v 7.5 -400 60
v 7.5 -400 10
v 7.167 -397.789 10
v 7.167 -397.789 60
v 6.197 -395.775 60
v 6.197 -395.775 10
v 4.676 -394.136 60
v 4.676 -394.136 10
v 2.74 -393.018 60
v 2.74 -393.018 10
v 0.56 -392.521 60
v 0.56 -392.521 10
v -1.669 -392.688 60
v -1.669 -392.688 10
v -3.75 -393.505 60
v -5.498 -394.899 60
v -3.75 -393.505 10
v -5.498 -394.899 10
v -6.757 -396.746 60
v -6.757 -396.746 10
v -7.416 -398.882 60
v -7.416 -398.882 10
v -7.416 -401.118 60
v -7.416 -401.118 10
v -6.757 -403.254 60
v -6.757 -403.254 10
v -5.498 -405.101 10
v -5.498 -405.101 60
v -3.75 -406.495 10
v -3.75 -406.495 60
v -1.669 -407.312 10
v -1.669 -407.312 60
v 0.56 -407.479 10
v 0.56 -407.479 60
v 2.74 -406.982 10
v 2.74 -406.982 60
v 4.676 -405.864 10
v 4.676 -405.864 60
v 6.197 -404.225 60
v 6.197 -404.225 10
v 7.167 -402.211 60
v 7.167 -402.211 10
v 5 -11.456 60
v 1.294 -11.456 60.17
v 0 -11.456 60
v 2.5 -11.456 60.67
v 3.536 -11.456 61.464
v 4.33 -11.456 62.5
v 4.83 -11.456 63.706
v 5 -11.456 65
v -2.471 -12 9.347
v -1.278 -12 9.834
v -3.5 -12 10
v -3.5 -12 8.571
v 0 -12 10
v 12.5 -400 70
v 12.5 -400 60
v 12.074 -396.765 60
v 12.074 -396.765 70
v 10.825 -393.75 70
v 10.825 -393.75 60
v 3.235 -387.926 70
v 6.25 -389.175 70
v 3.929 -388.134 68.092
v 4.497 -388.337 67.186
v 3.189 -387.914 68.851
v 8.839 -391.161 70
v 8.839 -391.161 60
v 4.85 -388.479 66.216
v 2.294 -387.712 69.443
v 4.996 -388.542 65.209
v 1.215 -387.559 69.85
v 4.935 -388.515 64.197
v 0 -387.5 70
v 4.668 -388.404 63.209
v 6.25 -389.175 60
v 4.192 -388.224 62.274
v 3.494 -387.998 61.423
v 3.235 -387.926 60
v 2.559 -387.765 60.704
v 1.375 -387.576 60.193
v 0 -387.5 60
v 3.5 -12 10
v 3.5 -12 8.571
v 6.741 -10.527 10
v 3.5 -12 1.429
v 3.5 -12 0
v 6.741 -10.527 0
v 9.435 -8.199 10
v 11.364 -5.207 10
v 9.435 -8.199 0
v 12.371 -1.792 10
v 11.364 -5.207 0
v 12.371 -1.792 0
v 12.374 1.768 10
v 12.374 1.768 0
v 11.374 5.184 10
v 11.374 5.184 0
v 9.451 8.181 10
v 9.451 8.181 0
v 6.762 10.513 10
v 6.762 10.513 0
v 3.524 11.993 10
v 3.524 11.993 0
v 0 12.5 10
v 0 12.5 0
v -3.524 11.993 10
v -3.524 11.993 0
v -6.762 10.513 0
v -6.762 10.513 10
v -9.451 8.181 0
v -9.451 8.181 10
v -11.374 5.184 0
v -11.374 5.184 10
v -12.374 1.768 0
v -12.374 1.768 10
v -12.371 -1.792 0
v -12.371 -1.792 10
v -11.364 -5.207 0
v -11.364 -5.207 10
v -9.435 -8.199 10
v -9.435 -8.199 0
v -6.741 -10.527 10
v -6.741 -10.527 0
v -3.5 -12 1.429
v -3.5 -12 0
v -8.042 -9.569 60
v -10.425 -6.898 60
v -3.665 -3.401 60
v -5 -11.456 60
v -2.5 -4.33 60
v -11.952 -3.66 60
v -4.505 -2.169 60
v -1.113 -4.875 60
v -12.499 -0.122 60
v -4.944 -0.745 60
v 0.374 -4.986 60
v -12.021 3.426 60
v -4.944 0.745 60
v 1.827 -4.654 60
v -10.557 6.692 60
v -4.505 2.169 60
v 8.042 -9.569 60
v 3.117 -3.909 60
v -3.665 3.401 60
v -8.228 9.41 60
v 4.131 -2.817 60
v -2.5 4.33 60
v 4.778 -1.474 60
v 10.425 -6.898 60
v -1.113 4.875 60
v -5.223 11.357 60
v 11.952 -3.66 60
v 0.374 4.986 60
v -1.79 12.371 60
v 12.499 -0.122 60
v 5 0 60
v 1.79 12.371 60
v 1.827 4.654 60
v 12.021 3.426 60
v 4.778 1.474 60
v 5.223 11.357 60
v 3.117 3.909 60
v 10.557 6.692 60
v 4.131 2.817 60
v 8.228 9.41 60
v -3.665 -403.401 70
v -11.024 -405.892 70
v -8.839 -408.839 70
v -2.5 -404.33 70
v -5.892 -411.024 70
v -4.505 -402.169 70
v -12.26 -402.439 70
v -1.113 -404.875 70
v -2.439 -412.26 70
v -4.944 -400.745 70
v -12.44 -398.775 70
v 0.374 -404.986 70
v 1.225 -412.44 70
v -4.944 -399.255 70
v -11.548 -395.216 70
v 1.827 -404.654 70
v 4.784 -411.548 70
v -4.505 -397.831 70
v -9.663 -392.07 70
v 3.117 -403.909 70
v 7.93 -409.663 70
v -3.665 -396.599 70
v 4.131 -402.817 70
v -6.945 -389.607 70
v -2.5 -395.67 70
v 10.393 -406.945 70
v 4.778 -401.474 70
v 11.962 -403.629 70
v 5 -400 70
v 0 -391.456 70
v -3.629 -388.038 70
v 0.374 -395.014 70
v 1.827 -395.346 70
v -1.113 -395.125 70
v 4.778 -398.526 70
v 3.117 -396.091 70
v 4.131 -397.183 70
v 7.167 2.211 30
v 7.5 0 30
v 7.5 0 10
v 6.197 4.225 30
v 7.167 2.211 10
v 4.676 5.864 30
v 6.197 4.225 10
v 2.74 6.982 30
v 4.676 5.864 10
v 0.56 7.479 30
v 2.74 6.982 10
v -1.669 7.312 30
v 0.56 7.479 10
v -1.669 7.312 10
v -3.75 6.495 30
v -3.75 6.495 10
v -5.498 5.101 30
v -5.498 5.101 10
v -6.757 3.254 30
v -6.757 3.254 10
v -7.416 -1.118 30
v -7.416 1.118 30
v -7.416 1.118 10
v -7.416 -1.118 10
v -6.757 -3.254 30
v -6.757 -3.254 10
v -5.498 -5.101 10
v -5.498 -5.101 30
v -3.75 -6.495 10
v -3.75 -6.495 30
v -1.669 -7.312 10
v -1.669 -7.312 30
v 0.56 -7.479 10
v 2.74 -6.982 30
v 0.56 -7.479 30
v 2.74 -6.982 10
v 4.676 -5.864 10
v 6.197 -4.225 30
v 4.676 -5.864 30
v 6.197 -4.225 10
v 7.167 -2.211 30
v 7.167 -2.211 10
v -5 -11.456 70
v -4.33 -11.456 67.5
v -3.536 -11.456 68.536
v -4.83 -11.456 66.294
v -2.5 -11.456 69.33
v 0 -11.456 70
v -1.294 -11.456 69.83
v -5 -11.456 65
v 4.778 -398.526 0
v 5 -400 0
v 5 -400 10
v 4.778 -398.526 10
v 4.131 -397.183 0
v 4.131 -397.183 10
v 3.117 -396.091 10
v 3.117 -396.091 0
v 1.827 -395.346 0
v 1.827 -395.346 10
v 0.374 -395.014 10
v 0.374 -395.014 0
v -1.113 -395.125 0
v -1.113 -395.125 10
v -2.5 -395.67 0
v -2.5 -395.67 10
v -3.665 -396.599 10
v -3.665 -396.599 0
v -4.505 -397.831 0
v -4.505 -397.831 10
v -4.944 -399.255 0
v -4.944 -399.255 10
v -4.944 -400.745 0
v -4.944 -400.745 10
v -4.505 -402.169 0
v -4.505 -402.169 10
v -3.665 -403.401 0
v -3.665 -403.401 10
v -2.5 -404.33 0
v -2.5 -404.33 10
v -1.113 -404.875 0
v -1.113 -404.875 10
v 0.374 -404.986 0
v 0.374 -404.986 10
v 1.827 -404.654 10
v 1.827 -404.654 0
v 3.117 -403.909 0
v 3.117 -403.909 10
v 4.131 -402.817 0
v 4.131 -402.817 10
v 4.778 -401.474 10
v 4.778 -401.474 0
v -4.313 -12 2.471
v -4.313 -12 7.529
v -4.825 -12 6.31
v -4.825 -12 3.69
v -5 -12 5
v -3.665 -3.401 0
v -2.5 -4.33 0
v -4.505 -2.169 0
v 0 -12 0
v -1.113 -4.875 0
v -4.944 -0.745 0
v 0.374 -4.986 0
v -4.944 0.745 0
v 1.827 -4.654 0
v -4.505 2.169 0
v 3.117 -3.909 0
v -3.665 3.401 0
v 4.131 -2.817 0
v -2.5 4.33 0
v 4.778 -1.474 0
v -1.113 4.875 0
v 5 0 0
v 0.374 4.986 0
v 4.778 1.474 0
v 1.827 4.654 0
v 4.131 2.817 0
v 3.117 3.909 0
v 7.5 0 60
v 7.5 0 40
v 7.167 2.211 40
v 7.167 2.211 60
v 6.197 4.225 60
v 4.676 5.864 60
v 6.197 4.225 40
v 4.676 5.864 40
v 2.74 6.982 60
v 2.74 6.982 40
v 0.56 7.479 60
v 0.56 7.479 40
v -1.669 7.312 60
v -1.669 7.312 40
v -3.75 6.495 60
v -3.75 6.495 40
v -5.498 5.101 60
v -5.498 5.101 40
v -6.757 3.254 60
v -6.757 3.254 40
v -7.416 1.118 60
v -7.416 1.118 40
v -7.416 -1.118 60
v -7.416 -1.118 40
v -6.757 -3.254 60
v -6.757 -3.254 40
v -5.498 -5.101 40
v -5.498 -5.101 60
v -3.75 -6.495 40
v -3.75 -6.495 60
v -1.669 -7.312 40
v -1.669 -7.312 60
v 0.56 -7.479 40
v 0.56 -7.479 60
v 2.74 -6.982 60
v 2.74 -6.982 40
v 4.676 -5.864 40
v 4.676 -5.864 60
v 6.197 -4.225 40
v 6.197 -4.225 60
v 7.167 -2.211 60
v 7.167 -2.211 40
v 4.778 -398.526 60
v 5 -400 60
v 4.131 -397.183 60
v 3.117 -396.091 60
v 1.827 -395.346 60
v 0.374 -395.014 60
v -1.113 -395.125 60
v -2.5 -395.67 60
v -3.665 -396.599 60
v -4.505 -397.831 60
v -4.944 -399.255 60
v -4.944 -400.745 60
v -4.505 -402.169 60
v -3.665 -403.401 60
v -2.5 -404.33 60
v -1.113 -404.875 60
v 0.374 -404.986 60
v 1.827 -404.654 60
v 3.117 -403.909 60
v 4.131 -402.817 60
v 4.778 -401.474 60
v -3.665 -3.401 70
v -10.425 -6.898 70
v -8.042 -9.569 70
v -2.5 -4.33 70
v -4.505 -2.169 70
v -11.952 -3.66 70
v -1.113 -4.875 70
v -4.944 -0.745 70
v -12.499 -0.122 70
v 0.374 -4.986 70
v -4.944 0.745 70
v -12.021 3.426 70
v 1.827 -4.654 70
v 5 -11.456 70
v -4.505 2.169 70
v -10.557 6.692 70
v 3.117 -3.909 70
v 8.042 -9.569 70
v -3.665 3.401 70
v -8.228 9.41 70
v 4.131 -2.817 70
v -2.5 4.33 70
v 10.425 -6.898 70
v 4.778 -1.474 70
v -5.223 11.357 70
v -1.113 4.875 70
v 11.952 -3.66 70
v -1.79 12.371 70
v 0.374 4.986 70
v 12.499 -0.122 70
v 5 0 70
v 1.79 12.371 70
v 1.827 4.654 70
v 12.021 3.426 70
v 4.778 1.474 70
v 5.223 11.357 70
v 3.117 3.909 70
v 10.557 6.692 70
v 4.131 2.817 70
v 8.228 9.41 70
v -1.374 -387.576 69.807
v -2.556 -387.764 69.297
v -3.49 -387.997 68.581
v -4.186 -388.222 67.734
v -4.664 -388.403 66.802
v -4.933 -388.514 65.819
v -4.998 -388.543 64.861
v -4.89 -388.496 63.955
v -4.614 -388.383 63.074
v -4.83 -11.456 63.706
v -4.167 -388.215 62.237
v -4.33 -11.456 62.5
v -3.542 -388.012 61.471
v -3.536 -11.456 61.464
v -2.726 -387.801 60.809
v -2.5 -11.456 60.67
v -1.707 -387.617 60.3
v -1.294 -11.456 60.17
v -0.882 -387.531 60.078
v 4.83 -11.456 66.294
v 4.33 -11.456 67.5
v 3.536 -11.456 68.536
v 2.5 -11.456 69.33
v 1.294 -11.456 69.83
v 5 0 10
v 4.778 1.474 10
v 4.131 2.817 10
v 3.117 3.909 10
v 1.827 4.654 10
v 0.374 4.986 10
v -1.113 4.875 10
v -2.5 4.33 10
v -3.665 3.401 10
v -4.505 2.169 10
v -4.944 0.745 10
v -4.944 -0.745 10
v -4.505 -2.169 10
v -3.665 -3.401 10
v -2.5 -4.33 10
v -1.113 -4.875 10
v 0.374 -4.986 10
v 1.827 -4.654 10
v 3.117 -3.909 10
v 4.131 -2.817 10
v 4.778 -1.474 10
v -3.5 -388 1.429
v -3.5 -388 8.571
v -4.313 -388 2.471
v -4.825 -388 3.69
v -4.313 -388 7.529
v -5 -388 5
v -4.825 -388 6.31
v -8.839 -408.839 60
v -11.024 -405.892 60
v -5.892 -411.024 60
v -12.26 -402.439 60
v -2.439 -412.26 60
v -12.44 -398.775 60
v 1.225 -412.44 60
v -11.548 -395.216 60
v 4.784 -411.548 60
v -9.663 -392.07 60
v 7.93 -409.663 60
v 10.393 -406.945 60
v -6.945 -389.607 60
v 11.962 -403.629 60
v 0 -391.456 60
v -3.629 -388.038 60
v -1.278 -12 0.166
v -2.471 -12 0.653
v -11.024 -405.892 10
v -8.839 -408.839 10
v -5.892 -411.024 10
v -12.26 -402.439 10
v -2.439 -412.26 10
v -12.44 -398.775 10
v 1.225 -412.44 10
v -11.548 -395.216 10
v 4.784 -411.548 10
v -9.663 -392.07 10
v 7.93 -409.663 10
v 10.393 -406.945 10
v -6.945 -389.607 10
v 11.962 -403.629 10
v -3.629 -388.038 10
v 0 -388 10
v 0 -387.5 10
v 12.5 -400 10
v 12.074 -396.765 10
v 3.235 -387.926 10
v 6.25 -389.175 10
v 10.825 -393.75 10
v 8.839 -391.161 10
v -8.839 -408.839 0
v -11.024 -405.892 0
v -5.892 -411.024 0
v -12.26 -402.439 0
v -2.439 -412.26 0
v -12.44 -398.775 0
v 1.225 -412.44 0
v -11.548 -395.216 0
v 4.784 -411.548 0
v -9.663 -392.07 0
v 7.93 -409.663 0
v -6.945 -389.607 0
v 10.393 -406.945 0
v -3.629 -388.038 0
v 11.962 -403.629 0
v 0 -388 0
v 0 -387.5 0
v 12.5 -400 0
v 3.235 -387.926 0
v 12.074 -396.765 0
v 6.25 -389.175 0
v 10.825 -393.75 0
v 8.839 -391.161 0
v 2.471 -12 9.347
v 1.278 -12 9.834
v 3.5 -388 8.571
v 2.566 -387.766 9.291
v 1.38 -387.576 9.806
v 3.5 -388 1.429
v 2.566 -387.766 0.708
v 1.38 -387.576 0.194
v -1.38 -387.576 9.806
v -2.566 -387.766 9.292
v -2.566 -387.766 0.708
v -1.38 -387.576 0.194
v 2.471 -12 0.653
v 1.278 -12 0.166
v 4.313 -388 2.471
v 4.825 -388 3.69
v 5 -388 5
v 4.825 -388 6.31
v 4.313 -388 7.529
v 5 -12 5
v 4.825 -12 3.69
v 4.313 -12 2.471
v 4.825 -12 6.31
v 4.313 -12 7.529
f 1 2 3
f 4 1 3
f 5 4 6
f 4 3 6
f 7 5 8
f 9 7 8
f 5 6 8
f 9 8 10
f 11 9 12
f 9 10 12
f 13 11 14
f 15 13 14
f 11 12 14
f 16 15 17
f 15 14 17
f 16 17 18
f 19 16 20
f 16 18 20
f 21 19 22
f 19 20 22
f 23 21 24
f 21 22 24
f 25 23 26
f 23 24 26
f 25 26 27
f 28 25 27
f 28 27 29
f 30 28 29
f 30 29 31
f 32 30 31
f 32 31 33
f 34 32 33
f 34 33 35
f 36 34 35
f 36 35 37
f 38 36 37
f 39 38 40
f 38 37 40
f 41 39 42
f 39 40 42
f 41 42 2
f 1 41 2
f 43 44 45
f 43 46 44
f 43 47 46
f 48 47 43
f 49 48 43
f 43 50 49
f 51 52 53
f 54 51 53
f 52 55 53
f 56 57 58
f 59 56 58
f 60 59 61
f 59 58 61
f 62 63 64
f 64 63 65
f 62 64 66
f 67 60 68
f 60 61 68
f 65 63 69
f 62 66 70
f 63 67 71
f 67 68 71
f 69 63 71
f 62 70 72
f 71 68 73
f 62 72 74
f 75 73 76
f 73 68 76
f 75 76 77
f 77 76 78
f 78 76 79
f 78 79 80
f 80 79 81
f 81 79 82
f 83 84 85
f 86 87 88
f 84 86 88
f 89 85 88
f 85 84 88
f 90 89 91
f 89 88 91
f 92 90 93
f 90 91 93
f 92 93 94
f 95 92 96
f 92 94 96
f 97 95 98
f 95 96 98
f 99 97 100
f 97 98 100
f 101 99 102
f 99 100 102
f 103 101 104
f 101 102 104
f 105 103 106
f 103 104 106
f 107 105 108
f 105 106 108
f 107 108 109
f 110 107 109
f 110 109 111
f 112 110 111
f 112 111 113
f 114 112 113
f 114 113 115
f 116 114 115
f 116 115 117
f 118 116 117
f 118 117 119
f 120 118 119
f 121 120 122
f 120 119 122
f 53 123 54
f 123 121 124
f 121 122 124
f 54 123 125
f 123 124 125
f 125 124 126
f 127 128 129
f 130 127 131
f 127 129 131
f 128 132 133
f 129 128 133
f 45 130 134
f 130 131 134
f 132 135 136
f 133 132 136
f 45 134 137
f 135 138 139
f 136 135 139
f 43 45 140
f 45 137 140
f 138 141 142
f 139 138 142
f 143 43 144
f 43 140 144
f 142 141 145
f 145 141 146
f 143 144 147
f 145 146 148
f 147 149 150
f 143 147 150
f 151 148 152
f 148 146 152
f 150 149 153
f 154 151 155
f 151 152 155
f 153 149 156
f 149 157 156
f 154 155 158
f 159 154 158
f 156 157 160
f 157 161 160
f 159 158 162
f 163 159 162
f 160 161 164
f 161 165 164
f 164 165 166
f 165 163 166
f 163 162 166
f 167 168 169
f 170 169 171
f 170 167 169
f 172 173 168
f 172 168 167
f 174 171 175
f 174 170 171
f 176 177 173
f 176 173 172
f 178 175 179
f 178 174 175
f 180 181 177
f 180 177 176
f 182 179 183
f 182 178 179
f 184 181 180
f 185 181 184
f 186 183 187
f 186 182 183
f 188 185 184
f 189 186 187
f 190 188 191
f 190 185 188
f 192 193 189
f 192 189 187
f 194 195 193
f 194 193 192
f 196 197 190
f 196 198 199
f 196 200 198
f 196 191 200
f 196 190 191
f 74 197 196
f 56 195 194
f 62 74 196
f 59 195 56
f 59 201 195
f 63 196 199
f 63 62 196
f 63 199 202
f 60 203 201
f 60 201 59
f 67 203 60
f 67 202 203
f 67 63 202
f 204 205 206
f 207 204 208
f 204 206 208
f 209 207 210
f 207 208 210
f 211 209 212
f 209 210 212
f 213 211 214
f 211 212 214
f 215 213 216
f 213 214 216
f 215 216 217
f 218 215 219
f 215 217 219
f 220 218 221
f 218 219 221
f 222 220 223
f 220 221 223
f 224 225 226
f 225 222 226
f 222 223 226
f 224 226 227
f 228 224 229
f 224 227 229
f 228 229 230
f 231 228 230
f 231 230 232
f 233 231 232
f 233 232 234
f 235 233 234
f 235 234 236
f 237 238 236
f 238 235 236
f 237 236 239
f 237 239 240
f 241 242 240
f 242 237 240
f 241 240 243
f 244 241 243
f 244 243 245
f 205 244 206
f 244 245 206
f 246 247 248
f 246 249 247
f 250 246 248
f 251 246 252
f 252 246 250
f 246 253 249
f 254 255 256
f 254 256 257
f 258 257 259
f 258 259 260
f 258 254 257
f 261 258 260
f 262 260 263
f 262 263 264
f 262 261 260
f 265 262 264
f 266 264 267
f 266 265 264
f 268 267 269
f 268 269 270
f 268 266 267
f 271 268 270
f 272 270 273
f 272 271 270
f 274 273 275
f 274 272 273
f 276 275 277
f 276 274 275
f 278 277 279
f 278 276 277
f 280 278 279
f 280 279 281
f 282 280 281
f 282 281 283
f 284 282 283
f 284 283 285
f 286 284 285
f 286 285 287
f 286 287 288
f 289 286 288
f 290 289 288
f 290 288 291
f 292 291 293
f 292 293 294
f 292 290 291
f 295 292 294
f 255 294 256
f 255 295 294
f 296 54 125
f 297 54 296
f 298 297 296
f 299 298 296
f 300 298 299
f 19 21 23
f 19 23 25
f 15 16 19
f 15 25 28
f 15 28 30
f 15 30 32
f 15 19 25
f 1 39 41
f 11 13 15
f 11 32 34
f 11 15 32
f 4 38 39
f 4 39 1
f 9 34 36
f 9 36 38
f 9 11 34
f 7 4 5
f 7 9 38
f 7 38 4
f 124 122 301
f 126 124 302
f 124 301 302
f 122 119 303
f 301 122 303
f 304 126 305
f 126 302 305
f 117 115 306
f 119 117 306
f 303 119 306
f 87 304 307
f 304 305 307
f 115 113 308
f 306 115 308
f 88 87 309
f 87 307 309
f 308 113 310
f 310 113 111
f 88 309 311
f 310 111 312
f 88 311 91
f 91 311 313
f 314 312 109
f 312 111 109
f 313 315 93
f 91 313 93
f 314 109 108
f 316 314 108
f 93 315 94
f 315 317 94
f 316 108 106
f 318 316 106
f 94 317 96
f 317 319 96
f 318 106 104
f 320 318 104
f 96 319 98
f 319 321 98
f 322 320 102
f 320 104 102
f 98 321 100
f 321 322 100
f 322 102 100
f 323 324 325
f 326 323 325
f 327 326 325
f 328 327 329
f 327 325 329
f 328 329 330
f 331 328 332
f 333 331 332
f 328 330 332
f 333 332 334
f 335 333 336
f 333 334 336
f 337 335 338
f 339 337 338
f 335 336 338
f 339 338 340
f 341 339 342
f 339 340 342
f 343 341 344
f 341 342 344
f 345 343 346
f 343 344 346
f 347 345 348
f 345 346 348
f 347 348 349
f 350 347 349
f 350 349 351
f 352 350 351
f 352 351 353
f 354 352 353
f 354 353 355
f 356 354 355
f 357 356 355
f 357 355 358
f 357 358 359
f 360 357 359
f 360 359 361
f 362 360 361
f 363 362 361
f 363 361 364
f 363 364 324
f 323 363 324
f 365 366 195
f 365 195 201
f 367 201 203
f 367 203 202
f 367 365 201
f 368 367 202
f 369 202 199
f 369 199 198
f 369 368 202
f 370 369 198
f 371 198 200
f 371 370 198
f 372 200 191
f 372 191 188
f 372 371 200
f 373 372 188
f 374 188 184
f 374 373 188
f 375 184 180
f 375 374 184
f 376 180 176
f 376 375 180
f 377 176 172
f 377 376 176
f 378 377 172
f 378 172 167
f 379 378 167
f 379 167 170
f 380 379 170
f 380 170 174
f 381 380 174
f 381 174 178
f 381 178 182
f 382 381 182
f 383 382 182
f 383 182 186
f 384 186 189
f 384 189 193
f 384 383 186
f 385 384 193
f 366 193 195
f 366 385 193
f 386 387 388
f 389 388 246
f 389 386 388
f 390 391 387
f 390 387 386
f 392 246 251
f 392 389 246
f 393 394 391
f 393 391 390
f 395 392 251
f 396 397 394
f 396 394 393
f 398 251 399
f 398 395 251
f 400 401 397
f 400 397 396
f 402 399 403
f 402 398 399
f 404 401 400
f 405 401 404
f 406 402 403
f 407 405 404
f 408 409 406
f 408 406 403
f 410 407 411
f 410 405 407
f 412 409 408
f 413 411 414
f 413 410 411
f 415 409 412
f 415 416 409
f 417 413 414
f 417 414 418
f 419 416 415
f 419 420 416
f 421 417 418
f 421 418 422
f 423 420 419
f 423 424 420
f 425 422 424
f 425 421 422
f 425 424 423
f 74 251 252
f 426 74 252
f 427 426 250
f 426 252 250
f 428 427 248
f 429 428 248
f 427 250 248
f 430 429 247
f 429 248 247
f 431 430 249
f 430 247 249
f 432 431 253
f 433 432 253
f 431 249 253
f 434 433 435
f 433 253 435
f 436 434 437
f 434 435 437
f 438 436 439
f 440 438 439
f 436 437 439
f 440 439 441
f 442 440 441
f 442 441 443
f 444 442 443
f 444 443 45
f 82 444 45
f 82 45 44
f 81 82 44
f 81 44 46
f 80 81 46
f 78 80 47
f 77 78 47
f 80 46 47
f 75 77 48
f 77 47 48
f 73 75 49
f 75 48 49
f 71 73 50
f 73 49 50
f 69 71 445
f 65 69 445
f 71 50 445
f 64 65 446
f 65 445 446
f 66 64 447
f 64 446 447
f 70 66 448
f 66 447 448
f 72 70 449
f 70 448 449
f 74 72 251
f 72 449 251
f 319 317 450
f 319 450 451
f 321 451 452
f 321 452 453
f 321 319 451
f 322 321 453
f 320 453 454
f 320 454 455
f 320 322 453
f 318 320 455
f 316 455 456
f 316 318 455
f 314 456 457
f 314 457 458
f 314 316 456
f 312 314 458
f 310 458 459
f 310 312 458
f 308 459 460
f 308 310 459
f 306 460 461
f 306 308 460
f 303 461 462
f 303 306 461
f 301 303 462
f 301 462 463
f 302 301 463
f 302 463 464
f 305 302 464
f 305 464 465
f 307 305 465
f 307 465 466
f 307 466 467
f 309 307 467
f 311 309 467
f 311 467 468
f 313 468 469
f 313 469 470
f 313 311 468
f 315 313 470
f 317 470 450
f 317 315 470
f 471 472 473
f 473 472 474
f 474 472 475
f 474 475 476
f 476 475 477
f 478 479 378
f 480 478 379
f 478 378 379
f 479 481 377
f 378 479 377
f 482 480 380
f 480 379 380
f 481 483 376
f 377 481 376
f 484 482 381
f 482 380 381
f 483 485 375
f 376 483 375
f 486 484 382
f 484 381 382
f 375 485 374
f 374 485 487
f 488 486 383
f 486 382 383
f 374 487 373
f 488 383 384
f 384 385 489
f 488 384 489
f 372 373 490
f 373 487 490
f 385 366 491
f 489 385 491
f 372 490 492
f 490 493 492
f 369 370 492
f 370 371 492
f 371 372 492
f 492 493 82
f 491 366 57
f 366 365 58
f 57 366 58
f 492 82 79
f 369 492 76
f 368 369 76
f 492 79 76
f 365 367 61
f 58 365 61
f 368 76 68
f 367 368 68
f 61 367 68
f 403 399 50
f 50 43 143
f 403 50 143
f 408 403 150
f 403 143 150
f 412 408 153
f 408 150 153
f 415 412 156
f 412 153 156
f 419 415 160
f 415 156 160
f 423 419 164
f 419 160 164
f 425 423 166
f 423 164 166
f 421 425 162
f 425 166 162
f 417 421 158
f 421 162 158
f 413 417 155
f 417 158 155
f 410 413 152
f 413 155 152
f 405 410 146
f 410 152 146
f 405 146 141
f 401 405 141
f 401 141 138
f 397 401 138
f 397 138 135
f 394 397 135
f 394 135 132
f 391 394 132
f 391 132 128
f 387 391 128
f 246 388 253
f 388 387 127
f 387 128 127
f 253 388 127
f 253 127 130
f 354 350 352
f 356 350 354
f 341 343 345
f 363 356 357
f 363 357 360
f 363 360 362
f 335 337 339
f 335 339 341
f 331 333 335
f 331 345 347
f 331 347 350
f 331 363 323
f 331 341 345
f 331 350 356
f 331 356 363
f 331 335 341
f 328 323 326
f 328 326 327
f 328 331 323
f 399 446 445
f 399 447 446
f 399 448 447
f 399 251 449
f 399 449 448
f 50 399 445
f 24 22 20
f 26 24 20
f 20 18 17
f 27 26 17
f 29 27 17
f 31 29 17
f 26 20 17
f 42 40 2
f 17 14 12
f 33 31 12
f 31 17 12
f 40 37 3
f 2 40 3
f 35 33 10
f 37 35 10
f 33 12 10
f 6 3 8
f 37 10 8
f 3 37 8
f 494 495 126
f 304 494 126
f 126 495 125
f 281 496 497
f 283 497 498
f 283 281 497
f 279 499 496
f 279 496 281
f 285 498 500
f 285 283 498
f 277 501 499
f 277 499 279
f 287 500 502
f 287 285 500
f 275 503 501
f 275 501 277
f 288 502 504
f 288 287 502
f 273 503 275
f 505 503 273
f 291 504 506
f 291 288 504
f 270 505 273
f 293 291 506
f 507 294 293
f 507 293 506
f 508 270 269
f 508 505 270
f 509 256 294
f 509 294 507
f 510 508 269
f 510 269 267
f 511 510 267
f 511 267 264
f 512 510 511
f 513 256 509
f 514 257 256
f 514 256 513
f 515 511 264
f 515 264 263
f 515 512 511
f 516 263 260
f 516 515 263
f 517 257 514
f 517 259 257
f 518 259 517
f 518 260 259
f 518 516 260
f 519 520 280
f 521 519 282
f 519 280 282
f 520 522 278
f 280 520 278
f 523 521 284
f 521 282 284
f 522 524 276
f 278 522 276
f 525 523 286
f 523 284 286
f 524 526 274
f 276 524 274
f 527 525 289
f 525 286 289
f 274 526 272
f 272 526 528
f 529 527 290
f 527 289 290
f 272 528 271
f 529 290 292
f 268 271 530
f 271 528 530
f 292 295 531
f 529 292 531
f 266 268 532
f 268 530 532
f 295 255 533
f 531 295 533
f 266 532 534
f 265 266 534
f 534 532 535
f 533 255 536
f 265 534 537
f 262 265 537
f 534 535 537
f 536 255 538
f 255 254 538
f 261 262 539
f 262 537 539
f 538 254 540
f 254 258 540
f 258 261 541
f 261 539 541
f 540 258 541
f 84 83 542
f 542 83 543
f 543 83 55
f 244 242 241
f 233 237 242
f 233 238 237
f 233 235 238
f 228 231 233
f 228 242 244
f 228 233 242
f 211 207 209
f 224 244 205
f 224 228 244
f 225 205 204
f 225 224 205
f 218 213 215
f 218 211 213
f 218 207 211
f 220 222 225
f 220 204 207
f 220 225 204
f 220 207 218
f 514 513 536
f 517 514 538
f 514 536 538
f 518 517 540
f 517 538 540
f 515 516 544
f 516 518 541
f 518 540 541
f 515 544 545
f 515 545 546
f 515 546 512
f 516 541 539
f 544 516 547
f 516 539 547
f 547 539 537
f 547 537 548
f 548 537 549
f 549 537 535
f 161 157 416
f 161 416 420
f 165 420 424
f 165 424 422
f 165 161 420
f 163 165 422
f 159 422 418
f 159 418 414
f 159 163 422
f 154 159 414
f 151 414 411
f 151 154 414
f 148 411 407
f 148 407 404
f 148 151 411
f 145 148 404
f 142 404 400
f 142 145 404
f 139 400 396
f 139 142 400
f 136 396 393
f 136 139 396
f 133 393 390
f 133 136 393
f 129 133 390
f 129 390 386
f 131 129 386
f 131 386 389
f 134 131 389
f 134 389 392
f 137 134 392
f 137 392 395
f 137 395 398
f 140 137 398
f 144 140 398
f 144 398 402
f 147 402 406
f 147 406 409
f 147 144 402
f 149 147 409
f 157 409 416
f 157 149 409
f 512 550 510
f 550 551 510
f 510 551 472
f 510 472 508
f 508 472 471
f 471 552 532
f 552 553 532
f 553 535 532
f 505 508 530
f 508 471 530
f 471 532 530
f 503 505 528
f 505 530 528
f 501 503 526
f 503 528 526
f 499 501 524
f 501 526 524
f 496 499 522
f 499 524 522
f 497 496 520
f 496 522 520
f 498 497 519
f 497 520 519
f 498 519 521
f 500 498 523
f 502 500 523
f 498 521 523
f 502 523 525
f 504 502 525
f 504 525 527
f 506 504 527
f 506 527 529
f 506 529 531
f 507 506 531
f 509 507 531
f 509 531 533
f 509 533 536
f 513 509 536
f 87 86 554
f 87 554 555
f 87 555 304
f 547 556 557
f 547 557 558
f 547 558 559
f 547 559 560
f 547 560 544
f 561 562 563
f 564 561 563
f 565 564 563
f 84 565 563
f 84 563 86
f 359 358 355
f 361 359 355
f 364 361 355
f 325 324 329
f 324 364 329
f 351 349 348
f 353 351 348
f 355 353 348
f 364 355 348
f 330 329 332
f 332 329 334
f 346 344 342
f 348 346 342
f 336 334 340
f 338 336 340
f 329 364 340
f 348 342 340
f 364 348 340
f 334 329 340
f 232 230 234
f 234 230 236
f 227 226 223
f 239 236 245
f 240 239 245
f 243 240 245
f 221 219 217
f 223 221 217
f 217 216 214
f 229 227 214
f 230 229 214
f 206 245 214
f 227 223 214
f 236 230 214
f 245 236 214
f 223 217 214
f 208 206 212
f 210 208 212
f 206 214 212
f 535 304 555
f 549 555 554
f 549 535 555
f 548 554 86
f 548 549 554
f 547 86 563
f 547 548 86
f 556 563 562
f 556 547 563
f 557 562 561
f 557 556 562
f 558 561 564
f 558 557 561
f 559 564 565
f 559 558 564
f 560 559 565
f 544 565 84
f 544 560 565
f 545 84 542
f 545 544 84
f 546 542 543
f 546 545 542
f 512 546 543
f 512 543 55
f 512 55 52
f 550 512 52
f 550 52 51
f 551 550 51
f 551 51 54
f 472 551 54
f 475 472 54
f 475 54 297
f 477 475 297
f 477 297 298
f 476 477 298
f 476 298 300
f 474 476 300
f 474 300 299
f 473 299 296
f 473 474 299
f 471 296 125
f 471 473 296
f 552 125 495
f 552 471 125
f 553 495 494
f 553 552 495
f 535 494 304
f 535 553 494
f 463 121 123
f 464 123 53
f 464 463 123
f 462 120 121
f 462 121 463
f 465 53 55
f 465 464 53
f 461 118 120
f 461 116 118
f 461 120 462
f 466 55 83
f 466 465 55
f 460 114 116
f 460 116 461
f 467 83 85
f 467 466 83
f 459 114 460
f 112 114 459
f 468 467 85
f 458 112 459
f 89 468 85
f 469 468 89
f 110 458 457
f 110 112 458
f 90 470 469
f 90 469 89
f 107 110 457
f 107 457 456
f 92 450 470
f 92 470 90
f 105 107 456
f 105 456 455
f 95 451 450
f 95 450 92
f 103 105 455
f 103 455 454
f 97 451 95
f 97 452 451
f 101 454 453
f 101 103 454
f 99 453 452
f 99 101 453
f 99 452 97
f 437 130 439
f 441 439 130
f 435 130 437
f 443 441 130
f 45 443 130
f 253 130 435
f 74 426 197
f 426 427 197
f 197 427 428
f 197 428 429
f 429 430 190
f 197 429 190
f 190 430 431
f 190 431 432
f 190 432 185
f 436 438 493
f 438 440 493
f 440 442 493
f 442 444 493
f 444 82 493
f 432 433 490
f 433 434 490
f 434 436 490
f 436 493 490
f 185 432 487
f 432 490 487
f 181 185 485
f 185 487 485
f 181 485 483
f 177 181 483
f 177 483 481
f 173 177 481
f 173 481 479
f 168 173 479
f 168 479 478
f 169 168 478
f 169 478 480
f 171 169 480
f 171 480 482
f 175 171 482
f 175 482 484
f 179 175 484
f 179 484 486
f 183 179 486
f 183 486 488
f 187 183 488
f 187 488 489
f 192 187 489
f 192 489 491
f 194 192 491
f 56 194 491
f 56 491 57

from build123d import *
from build123d.topology import SkipClean

# Parameters (mm, degrees)
SKETCH1_R               = 12.5
SKETCH1_R_2             = 5
BOSS_EXTRUDE1_DEPTH     = 10
CUT_EXTRUDE2_DEPTH      = 21.310096012
SKETCH3_R               = 5
BOSS_EXTRUDE2_DEPTH     = 188
SKETCH5_R               = 12.5
SKETCH5_R_2             = 5
BOSS_EXTRUDE4_DEPTH     = 10
SKETCH7_R               = 7.5
BOSS_EXTRUDE5_DEPTH     = 50
BOSS_EXTRUDE5_2_DEPTH   = 50
SKETCH8_R               = 12.5
SKETCH8_R_2             = 5
BOSS_EXTRUDE6_DEPTH     = 10
BOSS_EXTRUDE6_2_DEPTH   = 10
CUT_EXTRUDE3_DEPTH      = 20
SKETCH10_R              = 5
BOSS_EXTRUDE7_DEPTH     = 380
SKETCH11_W              = 10
SKETCH11_H              = 26.37697812
CUT_EXTRUDE5_DEPTH      = 419.583922409
CUT_EXTRUDE5_DEPTH_BACK = 419.583922409


with BuildPart() as part:
    # Sketch1 → Boss-Extrude1 (new body)
    with BuildSketch(Plane.XY):
        Circle(SKETCH1_R)
        Circle(SKETCH1_R_2, mode=Mode.SUBTRACT)
    extrude(amount=BOSS_EXTRUDE1_DEPTH)

    # Sketch2 → Cut-Extrude2 (cut, through all)
    with BuildSketch(Plane.XY.offset(10)):
        with BuildLine():
            Line((9.108105184, -12), (3.5, -12))
            ThreePointArc((3.5, -12), (0, -12.5), (-3.5, -12))
            Line((-3.5, -12), (-7.494861462, -12))
            Line((-7.494861462, -12), (-7.494861462, -13.628548532))
            Line((-7.494861462, -13.628548532), (9.511416115, -13.628548532))
            Line((9.511416115, -13.628548532), (9.108105184, -12))
        make_face()
        with BuildLine():
            Line((3.5, -12), (0, -12))
            Line((0, -12), (-3.5, -12))
            ThreePointArc((-3.5, -12), (0, -12.5), (3.5, -12))
        make_face()
    extrude(amount=-CUT_EXTRUDE2_DEPTH, mode=Mode.SUBTRACT)

    # Sketch3 → Boss-Extrude2 (add)
    with BuildSketch(Plane(origin=(0, -12, 0), x_dir=(-1, 0, 0), z_dir=(0, -1, 0))):
        with Locations(Location((0, -5, 0), (0, 0, 90))):
            Circle(SKETCH3_R)
    boss_extrude2 = extrude(amount=BOSS_EXTRUDE2_DEPTH)

    # Mirror2: Boss-Extrude2 across plane
    add(boss_extrude2.mirror(Plane(origin=(0, -200, 5), x_dir=(0, 0, 1), z_dir=(0, -1, 0))))

    # Sketch5 → Boss-Extrude4 (add)
    with SkipClean():  # the faces are left unmerged after this step: merging them gives an invalid solid
        with BuildSketch(Plane.XY):
            with Locations((0, -400)):
                Circle(SKETCH5_R)
            with Locations((0, -400)):
                Circle(SKETCH5_R_2, mode=Mode.SUBTRACT)
        extrude(amount=BOSS_EXTRUDE4_DEPTH)


with BuildPart() as body_2:
    # Sketch7 → Boss-Extrude5 (new body)
    with BuildSketch(Plane.XY.offset(10)):
        Circle(SKETCH7_R)
    extrude(amount=BOSS_EXTRUDE5_DEPTH)

    # Sketch11 → Cut-Extrude5 (cut, two sides)
    with BuildSketch(Plane(origin=(0, 0, 0), x_dir=(0, 0, -1), z_dir=(1, 0, 0))) as cut_extrude5_sk:
        with Locations((-35, -5.68848906)):
            Rectangle(SKETCH11_W, SKETCH11_H)
    extrude(amount=CUT_EXTRUDE5_DEPTH, mode=Mode.SUBTRACT)
    extrude(cut_extrude5_sk.sketch, amount=-CUT_EXTRUDE5_DEPTH_BACK, mode=Mode.SUBTRACT)


with BuildPart() as body_3:
    # Sketch7 → Boss-Extrude5 2 (new body)
    with BuildSketch(Plane.XY.offset(10)):
        with Locations((0, -400)):
            Circle(SKETCH7_R)
    extrude(amount=BOSS_EXTRUDE5_2_DEPTH)


with BuildPart() as body_4:
    # Sketch8 → Boss-Extrude6 (new body)
    with BuildSketch(Plane.XY.offset(60)):
        Circle(SKETCH8_R)
        Circle(SKETCH8_R_2, mode=Mode.SUBTRACT)
    extrude(amount=BOSS_EXTRUDE6_DEPTH)

    # Sketch9 → Cut-Extrude3 (cut)
    with BuildSketch(Plane.XY.offset(70)):
        Polygon((-5, -12), (-5, -11.456439237), (5, -11.456439237), (5, -13.442017523), align=None)
    extrude(amount=-CUT_EXTRUDE3_DEPTH, mode=Mode.SUBTRACT)



with BuildPart() as body_5:
    # Sketch8 → Boss-Extrude6 2 (new body)
    with BuildSketch(Plane.XY.offset(60)):
        with Locations((0, -400)):
            Circle(SKETCH8_R)
        with Locations((0, -400)):
            Circle(SKETCH8_R_2, mode=Mode.SUBTRACT)
    extrude(amount=BOSS_EXTRUDE6_2_DEPTH)


with BuildPart() as body_4_1:
    with SkipClean():  # the faces are left unmerged after this step: merging them gives an invalid solid
        add(body_4.part)

        add(body_5.part)  # Boss-Extrude7 merges body 5
        # Sketch10 → Boss-Extrude7 (add)
        with BuildSketch(Plane(origin=(0, -11.456439237, 0), x_dir=(-1, 0, 0), z_dir=(0, -1, 0))):
            with Locations(Location((0, -65, 0), (0, 0, 270))):
                Circle(SKETCH10_R)
        extrude(amount=BOSS_EXTRUDE7_DEPTH)


with BuildPart() as cut_extrude5_piece_1:
    # of the separate pieces the step leaves, piece 1, a body of its own (cut_extrude5_pieces)
    add(body_2.part.solids().sort_by_distance((7.5, 0, 40))[0])


with BuildPart() as cut_extrude5_piece_2:
    # of the separate pieces the step leaves, piece 2, a body of its own (cut_extrude5_pieces)
    add(body_2.part.solids().sort_by_distance((7.5, 0, 10))[0])


solid = Compound([part.part, body_3.part, body_4_1.part, cut_extrude5_piece_1.part, cut_extrude5_piece_2.part])
